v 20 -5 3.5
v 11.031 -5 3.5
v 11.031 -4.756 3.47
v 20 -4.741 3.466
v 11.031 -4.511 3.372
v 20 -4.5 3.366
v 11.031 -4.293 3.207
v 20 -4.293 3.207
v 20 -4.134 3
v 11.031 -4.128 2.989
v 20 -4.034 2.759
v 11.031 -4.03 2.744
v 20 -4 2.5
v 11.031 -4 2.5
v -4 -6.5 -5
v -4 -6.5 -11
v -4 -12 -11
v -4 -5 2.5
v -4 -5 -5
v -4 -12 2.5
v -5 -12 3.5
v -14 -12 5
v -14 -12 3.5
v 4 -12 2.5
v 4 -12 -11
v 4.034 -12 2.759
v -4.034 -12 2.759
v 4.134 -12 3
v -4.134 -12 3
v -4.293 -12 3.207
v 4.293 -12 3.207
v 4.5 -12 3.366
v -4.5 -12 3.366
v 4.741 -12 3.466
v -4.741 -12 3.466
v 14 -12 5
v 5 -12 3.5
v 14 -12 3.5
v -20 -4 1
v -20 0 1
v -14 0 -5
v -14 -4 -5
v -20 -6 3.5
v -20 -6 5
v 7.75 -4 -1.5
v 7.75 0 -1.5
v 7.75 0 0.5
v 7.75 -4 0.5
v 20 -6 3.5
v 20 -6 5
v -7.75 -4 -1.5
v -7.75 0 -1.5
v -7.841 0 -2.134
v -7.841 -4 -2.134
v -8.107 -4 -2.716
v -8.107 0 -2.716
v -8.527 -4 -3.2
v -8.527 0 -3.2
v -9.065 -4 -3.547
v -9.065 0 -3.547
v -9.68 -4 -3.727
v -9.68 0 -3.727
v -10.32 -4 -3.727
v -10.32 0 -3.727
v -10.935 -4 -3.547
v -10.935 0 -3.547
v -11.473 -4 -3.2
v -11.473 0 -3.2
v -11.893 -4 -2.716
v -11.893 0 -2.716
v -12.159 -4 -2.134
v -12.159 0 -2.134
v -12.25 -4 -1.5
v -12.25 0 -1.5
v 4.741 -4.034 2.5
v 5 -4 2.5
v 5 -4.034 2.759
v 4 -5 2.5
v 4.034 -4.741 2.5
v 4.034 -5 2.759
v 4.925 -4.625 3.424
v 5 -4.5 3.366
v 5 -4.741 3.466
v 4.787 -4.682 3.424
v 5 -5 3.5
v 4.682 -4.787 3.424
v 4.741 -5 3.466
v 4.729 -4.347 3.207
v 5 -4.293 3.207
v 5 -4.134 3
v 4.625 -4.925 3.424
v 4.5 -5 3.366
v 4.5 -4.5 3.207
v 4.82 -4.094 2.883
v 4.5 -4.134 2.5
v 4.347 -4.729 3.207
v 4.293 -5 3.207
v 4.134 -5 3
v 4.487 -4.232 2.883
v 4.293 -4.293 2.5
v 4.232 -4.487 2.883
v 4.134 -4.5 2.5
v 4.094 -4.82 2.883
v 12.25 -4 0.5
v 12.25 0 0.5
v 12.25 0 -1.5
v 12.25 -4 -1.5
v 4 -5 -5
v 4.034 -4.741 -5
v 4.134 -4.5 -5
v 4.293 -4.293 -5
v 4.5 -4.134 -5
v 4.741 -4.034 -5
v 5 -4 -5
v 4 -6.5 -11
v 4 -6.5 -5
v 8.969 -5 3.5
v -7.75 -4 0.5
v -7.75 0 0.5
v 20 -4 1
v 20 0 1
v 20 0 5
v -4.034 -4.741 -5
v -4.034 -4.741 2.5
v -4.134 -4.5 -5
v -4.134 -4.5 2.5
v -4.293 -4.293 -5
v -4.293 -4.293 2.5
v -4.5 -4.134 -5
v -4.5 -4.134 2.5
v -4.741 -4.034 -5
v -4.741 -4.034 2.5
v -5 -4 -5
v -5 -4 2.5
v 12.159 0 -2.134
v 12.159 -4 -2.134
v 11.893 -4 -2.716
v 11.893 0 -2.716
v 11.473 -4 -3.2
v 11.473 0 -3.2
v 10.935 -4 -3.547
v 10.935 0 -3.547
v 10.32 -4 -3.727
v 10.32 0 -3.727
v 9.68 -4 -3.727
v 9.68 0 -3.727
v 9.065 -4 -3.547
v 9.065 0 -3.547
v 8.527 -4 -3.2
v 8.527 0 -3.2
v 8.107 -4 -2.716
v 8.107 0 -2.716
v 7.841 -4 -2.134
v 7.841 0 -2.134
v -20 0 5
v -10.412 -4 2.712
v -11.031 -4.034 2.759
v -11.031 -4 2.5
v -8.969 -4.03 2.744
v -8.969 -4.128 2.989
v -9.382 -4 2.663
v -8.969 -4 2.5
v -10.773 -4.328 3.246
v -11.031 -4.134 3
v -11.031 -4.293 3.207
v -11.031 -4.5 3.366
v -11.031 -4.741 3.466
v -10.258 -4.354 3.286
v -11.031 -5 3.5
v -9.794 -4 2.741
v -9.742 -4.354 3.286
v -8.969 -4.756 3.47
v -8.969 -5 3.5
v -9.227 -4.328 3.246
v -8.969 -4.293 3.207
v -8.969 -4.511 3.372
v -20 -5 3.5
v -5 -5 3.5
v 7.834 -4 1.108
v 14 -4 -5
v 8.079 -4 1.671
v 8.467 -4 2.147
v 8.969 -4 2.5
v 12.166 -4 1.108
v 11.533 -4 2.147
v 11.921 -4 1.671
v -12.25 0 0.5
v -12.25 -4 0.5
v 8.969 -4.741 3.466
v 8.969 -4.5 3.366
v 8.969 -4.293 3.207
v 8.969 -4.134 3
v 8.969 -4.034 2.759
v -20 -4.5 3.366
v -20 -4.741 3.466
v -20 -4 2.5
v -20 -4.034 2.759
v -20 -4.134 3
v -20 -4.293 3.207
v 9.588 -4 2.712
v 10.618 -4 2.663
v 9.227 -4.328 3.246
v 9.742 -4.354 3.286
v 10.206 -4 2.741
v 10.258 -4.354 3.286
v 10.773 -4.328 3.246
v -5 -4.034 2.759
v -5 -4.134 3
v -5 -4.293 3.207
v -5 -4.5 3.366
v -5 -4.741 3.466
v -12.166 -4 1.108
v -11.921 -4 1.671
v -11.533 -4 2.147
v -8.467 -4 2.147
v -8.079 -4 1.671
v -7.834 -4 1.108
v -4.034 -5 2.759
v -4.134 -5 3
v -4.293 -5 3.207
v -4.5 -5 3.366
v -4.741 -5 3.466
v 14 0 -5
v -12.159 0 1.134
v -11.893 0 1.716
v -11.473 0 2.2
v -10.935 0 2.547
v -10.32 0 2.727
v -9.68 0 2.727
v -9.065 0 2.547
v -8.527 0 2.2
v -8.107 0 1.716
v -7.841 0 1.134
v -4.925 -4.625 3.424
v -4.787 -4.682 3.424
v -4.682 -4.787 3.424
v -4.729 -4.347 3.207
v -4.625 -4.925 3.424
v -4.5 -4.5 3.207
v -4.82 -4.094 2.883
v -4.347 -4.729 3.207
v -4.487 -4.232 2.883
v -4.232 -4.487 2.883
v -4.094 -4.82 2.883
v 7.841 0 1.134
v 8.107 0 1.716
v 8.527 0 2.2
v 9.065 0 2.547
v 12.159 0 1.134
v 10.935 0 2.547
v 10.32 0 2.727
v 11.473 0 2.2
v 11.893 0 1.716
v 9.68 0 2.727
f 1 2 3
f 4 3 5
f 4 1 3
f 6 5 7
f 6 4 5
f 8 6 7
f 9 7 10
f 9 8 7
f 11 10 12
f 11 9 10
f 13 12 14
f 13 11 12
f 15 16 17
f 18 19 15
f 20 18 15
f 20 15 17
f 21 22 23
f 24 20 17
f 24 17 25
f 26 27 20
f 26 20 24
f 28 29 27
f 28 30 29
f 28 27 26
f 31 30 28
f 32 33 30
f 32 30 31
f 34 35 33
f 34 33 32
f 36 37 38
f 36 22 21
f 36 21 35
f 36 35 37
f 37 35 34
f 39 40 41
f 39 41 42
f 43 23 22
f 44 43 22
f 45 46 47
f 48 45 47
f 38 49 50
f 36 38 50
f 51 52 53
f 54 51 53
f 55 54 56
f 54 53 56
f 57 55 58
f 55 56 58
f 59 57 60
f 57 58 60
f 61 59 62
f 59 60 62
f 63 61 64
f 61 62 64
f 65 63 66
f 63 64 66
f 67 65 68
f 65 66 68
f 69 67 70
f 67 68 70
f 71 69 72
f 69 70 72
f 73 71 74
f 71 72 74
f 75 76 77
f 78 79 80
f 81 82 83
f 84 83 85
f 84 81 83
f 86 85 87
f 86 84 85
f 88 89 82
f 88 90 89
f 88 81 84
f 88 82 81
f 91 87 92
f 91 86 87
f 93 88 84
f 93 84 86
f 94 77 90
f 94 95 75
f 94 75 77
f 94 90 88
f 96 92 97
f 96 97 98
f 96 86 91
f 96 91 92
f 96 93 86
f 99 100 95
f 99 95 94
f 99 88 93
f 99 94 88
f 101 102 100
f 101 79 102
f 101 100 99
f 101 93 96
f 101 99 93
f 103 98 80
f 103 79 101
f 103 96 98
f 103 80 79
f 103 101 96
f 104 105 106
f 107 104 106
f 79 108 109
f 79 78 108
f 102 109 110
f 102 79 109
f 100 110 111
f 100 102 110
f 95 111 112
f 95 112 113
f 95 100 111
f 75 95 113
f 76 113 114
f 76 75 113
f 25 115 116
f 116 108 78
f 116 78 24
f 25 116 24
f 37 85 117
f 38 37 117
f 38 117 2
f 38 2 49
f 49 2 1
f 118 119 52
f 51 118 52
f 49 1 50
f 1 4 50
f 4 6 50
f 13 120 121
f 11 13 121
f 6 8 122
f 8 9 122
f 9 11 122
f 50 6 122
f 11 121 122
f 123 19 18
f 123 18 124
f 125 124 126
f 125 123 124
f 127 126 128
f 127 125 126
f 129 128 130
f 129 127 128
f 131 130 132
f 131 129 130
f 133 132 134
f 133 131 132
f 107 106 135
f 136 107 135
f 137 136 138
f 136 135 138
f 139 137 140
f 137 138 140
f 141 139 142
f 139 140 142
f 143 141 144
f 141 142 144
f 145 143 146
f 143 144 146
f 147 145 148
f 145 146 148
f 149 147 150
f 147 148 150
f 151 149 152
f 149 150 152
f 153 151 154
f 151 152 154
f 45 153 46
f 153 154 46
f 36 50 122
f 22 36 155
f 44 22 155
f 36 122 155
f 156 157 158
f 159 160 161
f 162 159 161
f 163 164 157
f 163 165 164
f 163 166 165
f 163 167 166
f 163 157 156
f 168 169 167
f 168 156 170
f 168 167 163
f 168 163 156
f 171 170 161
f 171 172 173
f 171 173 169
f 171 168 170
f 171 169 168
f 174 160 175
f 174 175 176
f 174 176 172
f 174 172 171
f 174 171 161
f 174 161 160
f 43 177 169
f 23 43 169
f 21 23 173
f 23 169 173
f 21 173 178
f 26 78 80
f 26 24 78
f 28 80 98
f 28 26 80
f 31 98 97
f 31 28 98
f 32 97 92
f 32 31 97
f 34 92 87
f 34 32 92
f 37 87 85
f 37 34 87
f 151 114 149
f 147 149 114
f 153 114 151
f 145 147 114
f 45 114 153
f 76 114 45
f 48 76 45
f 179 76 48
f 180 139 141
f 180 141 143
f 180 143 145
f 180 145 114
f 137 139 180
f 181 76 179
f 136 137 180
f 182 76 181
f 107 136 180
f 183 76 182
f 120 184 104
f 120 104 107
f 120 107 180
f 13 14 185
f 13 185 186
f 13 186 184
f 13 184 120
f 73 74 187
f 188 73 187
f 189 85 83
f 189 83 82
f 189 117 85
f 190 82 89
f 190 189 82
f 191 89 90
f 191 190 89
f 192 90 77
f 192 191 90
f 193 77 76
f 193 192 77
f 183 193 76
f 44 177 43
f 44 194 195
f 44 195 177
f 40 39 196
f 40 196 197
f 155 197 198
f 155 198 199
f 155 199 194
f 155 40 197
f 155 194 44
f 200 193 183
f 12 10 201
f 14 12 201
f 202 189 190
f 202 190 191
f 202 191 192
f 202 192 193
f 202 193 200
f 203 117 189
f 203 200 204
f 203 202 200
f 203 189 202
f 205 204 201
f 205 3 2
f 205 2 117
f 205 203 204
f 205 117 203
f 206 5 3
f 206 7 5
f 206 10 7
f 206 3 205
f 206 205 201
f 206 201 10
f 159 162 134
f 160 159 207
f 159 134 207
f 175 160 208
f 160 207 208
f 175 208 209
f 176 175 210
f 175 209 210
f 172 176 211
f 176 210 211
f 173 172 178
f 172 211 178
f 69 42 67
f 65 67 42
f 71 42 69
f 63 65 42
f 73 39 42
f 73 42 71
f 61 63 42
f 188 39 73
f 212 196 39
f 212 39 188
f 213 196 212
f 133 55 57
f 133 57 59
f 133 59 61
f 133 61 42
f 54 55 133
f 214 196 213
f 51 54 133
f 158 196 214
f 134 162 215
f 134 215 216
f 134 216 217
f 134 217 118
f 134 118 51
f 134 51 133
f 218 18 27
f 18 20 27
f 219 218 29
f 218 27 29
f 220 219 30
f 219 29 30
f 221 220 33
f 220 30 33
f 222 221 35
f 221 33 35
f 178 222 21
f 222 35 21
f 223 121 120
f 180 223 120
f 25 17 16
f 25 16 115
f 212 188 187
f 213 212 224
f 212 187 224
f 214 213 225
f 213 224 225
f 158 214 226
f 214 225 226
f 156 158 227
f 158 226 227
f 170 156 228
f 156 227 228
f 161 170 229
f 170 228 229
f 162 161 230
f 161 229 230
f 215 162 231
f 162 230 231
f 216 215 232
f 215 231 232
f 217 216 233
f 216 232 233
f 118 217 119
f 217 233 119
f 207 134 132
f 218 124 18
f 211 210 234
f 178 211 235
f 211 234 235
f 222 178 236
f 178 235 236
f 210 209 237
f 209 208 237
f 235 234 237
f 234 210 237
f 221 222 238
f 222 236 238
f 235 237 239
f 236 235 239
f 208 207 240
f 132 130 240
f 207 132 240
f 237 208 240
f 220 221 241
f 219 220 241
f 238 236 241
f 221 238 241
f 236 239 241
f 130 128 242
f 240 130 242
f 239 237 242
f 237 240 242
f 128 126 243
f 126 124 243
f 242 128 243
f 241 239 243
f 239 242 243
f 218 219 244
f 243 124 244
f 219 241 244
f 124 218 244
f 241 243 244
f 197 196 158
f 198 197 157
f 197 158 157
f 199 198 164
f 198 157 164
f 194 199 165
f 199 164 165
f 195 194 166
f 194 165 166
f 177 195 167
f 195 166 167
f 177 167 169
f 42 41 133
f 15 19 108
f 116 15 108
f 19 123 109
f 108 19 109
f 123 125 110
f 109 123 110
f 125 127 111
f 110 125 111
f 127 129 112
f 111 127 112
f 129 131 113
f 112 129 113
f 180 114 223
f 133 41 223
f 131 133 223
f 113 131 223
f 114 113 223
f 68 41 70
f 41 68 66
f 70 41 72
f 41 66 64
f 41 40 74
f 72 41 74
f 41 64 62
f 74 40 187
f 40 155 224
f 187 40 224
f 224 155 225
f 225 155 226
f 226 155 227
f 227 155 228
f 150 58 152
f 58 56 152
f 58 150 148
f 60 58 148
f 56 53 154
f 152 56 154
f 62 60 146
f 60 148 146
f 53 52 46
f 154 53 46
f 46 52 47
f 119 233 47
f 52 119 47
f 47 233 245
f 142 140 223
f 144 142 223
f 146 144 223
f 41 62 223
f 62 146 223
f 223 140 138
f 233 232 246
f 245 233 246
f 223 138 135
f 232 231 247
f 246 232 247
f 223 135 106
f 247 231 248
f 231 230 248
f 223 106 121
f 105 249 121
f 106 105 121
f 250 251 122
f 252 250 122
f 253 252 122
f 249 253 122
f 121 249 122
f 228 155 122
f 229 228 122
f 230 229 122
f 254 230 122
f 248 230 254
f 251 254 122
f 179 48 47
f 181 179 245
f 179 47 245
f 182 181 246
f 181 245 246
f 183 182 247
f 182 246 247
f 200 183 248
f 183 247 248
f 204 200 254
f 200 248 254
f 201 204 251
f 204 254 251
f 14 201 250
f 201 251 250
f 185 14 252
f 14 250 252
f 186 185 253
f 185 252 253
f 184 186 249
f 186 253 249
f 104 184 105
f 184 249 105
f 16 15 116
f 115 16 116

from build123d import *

# Parameters (mm, degrees)
F0_W     = 40
F0_H     = 10
F1_DEPTH = 4
F2_W     = 16
F2_H     = 1.5
F3_DEPTH = 8
F4_W     = 8
F4_H     = 5.5
F5_DEPTH = 6
F6_R     = 1
F7_SIZE  = 6


# Not quite as in the source:
# - a feature names something its author has since deleted; it is built from what else it names


with BuildPart() as f1:
    # F0 (on Front) → F1 (new body)
    with BuildSketch(Plane.XZ):
        Rectangle(F0_W, F0_H)
        with BuildLine():
            Line((-12.25, -1.5), (-12.25, 0.5))
            ThreePointArc((-12.25, 0.5), (-10, 2.75), (-7.75, 0.5))
            Line((-7.75, 0.5), (-7.75, -1.5))
            ThreePointArc((-7.75, -1.5), (-10, -3.75), (-12.25, -1.5))
        make_face(mode=Mode.SUBTRACT)
        with BuildLine():
            ThreePointArc((7.75, 0.5), (10, 2.75), (12.25, 0.5))
            Line((12.25, 0.5), (12.25, -1.5))
            ThreePointArc((12.25, -1.5), (10, -3.75), (7.75, -1.5))
            Line((7.75, -1.5), (7.75, 0.5))
        make_face(mode=Mode.SUBTRACT)
    extrude(amount=F1_DEPTH)

    # F2 (on face) → F3 (join)
    with BuildSketch(Plane.XZ.offset(4)):
        Polygon((4, 5), (-4, 5), (-4, 3.5), (-4, -5), (4, -5), (4, 3.5), align=None)
        with Locations((-12, 4.25)):
            Rectangle(F2_W, F2_H)
        with Locations((12, 4.25)):
            Rectangle(F2_W, F2_H)
    extrude(amount=F3_DEPTH)

    # F4 (on face) → F5 (join)
    with BuildSketch(Plane(origin=(0, 0, -5), x_dir=(1, 0, 0), z_dir=(0, 0, -1))):
        with Locations((0, 9.25)):
            Rectangle(F4_W, F4_H)
    extrude(amount=F5_DEPTH)

    # F6
    f6_edges = [f1.edges().sort_by_distance(p)[0] for p in [
        (4, -4, -0.75),
        (-4, -4, -0.75),
        (-12, -4, 3.5),
        (12, -4, 3.5),
        (4, -8, 3.5),
        (-4, -8, 3.5),
    ]]
    fillet(f6_edges, radius=F6_R)

    # F7
    f7_edges = [f1.edges().sort_by_distance(p)[0] for p in [
        (-20, -12, 4.25),
        (20, -12, 4.25),
        (20, -2, -5),
        (-20, -2, -5),
    ]]
    chamfer(f7_edges, length=F7_SIZE)


solid = f1.part
